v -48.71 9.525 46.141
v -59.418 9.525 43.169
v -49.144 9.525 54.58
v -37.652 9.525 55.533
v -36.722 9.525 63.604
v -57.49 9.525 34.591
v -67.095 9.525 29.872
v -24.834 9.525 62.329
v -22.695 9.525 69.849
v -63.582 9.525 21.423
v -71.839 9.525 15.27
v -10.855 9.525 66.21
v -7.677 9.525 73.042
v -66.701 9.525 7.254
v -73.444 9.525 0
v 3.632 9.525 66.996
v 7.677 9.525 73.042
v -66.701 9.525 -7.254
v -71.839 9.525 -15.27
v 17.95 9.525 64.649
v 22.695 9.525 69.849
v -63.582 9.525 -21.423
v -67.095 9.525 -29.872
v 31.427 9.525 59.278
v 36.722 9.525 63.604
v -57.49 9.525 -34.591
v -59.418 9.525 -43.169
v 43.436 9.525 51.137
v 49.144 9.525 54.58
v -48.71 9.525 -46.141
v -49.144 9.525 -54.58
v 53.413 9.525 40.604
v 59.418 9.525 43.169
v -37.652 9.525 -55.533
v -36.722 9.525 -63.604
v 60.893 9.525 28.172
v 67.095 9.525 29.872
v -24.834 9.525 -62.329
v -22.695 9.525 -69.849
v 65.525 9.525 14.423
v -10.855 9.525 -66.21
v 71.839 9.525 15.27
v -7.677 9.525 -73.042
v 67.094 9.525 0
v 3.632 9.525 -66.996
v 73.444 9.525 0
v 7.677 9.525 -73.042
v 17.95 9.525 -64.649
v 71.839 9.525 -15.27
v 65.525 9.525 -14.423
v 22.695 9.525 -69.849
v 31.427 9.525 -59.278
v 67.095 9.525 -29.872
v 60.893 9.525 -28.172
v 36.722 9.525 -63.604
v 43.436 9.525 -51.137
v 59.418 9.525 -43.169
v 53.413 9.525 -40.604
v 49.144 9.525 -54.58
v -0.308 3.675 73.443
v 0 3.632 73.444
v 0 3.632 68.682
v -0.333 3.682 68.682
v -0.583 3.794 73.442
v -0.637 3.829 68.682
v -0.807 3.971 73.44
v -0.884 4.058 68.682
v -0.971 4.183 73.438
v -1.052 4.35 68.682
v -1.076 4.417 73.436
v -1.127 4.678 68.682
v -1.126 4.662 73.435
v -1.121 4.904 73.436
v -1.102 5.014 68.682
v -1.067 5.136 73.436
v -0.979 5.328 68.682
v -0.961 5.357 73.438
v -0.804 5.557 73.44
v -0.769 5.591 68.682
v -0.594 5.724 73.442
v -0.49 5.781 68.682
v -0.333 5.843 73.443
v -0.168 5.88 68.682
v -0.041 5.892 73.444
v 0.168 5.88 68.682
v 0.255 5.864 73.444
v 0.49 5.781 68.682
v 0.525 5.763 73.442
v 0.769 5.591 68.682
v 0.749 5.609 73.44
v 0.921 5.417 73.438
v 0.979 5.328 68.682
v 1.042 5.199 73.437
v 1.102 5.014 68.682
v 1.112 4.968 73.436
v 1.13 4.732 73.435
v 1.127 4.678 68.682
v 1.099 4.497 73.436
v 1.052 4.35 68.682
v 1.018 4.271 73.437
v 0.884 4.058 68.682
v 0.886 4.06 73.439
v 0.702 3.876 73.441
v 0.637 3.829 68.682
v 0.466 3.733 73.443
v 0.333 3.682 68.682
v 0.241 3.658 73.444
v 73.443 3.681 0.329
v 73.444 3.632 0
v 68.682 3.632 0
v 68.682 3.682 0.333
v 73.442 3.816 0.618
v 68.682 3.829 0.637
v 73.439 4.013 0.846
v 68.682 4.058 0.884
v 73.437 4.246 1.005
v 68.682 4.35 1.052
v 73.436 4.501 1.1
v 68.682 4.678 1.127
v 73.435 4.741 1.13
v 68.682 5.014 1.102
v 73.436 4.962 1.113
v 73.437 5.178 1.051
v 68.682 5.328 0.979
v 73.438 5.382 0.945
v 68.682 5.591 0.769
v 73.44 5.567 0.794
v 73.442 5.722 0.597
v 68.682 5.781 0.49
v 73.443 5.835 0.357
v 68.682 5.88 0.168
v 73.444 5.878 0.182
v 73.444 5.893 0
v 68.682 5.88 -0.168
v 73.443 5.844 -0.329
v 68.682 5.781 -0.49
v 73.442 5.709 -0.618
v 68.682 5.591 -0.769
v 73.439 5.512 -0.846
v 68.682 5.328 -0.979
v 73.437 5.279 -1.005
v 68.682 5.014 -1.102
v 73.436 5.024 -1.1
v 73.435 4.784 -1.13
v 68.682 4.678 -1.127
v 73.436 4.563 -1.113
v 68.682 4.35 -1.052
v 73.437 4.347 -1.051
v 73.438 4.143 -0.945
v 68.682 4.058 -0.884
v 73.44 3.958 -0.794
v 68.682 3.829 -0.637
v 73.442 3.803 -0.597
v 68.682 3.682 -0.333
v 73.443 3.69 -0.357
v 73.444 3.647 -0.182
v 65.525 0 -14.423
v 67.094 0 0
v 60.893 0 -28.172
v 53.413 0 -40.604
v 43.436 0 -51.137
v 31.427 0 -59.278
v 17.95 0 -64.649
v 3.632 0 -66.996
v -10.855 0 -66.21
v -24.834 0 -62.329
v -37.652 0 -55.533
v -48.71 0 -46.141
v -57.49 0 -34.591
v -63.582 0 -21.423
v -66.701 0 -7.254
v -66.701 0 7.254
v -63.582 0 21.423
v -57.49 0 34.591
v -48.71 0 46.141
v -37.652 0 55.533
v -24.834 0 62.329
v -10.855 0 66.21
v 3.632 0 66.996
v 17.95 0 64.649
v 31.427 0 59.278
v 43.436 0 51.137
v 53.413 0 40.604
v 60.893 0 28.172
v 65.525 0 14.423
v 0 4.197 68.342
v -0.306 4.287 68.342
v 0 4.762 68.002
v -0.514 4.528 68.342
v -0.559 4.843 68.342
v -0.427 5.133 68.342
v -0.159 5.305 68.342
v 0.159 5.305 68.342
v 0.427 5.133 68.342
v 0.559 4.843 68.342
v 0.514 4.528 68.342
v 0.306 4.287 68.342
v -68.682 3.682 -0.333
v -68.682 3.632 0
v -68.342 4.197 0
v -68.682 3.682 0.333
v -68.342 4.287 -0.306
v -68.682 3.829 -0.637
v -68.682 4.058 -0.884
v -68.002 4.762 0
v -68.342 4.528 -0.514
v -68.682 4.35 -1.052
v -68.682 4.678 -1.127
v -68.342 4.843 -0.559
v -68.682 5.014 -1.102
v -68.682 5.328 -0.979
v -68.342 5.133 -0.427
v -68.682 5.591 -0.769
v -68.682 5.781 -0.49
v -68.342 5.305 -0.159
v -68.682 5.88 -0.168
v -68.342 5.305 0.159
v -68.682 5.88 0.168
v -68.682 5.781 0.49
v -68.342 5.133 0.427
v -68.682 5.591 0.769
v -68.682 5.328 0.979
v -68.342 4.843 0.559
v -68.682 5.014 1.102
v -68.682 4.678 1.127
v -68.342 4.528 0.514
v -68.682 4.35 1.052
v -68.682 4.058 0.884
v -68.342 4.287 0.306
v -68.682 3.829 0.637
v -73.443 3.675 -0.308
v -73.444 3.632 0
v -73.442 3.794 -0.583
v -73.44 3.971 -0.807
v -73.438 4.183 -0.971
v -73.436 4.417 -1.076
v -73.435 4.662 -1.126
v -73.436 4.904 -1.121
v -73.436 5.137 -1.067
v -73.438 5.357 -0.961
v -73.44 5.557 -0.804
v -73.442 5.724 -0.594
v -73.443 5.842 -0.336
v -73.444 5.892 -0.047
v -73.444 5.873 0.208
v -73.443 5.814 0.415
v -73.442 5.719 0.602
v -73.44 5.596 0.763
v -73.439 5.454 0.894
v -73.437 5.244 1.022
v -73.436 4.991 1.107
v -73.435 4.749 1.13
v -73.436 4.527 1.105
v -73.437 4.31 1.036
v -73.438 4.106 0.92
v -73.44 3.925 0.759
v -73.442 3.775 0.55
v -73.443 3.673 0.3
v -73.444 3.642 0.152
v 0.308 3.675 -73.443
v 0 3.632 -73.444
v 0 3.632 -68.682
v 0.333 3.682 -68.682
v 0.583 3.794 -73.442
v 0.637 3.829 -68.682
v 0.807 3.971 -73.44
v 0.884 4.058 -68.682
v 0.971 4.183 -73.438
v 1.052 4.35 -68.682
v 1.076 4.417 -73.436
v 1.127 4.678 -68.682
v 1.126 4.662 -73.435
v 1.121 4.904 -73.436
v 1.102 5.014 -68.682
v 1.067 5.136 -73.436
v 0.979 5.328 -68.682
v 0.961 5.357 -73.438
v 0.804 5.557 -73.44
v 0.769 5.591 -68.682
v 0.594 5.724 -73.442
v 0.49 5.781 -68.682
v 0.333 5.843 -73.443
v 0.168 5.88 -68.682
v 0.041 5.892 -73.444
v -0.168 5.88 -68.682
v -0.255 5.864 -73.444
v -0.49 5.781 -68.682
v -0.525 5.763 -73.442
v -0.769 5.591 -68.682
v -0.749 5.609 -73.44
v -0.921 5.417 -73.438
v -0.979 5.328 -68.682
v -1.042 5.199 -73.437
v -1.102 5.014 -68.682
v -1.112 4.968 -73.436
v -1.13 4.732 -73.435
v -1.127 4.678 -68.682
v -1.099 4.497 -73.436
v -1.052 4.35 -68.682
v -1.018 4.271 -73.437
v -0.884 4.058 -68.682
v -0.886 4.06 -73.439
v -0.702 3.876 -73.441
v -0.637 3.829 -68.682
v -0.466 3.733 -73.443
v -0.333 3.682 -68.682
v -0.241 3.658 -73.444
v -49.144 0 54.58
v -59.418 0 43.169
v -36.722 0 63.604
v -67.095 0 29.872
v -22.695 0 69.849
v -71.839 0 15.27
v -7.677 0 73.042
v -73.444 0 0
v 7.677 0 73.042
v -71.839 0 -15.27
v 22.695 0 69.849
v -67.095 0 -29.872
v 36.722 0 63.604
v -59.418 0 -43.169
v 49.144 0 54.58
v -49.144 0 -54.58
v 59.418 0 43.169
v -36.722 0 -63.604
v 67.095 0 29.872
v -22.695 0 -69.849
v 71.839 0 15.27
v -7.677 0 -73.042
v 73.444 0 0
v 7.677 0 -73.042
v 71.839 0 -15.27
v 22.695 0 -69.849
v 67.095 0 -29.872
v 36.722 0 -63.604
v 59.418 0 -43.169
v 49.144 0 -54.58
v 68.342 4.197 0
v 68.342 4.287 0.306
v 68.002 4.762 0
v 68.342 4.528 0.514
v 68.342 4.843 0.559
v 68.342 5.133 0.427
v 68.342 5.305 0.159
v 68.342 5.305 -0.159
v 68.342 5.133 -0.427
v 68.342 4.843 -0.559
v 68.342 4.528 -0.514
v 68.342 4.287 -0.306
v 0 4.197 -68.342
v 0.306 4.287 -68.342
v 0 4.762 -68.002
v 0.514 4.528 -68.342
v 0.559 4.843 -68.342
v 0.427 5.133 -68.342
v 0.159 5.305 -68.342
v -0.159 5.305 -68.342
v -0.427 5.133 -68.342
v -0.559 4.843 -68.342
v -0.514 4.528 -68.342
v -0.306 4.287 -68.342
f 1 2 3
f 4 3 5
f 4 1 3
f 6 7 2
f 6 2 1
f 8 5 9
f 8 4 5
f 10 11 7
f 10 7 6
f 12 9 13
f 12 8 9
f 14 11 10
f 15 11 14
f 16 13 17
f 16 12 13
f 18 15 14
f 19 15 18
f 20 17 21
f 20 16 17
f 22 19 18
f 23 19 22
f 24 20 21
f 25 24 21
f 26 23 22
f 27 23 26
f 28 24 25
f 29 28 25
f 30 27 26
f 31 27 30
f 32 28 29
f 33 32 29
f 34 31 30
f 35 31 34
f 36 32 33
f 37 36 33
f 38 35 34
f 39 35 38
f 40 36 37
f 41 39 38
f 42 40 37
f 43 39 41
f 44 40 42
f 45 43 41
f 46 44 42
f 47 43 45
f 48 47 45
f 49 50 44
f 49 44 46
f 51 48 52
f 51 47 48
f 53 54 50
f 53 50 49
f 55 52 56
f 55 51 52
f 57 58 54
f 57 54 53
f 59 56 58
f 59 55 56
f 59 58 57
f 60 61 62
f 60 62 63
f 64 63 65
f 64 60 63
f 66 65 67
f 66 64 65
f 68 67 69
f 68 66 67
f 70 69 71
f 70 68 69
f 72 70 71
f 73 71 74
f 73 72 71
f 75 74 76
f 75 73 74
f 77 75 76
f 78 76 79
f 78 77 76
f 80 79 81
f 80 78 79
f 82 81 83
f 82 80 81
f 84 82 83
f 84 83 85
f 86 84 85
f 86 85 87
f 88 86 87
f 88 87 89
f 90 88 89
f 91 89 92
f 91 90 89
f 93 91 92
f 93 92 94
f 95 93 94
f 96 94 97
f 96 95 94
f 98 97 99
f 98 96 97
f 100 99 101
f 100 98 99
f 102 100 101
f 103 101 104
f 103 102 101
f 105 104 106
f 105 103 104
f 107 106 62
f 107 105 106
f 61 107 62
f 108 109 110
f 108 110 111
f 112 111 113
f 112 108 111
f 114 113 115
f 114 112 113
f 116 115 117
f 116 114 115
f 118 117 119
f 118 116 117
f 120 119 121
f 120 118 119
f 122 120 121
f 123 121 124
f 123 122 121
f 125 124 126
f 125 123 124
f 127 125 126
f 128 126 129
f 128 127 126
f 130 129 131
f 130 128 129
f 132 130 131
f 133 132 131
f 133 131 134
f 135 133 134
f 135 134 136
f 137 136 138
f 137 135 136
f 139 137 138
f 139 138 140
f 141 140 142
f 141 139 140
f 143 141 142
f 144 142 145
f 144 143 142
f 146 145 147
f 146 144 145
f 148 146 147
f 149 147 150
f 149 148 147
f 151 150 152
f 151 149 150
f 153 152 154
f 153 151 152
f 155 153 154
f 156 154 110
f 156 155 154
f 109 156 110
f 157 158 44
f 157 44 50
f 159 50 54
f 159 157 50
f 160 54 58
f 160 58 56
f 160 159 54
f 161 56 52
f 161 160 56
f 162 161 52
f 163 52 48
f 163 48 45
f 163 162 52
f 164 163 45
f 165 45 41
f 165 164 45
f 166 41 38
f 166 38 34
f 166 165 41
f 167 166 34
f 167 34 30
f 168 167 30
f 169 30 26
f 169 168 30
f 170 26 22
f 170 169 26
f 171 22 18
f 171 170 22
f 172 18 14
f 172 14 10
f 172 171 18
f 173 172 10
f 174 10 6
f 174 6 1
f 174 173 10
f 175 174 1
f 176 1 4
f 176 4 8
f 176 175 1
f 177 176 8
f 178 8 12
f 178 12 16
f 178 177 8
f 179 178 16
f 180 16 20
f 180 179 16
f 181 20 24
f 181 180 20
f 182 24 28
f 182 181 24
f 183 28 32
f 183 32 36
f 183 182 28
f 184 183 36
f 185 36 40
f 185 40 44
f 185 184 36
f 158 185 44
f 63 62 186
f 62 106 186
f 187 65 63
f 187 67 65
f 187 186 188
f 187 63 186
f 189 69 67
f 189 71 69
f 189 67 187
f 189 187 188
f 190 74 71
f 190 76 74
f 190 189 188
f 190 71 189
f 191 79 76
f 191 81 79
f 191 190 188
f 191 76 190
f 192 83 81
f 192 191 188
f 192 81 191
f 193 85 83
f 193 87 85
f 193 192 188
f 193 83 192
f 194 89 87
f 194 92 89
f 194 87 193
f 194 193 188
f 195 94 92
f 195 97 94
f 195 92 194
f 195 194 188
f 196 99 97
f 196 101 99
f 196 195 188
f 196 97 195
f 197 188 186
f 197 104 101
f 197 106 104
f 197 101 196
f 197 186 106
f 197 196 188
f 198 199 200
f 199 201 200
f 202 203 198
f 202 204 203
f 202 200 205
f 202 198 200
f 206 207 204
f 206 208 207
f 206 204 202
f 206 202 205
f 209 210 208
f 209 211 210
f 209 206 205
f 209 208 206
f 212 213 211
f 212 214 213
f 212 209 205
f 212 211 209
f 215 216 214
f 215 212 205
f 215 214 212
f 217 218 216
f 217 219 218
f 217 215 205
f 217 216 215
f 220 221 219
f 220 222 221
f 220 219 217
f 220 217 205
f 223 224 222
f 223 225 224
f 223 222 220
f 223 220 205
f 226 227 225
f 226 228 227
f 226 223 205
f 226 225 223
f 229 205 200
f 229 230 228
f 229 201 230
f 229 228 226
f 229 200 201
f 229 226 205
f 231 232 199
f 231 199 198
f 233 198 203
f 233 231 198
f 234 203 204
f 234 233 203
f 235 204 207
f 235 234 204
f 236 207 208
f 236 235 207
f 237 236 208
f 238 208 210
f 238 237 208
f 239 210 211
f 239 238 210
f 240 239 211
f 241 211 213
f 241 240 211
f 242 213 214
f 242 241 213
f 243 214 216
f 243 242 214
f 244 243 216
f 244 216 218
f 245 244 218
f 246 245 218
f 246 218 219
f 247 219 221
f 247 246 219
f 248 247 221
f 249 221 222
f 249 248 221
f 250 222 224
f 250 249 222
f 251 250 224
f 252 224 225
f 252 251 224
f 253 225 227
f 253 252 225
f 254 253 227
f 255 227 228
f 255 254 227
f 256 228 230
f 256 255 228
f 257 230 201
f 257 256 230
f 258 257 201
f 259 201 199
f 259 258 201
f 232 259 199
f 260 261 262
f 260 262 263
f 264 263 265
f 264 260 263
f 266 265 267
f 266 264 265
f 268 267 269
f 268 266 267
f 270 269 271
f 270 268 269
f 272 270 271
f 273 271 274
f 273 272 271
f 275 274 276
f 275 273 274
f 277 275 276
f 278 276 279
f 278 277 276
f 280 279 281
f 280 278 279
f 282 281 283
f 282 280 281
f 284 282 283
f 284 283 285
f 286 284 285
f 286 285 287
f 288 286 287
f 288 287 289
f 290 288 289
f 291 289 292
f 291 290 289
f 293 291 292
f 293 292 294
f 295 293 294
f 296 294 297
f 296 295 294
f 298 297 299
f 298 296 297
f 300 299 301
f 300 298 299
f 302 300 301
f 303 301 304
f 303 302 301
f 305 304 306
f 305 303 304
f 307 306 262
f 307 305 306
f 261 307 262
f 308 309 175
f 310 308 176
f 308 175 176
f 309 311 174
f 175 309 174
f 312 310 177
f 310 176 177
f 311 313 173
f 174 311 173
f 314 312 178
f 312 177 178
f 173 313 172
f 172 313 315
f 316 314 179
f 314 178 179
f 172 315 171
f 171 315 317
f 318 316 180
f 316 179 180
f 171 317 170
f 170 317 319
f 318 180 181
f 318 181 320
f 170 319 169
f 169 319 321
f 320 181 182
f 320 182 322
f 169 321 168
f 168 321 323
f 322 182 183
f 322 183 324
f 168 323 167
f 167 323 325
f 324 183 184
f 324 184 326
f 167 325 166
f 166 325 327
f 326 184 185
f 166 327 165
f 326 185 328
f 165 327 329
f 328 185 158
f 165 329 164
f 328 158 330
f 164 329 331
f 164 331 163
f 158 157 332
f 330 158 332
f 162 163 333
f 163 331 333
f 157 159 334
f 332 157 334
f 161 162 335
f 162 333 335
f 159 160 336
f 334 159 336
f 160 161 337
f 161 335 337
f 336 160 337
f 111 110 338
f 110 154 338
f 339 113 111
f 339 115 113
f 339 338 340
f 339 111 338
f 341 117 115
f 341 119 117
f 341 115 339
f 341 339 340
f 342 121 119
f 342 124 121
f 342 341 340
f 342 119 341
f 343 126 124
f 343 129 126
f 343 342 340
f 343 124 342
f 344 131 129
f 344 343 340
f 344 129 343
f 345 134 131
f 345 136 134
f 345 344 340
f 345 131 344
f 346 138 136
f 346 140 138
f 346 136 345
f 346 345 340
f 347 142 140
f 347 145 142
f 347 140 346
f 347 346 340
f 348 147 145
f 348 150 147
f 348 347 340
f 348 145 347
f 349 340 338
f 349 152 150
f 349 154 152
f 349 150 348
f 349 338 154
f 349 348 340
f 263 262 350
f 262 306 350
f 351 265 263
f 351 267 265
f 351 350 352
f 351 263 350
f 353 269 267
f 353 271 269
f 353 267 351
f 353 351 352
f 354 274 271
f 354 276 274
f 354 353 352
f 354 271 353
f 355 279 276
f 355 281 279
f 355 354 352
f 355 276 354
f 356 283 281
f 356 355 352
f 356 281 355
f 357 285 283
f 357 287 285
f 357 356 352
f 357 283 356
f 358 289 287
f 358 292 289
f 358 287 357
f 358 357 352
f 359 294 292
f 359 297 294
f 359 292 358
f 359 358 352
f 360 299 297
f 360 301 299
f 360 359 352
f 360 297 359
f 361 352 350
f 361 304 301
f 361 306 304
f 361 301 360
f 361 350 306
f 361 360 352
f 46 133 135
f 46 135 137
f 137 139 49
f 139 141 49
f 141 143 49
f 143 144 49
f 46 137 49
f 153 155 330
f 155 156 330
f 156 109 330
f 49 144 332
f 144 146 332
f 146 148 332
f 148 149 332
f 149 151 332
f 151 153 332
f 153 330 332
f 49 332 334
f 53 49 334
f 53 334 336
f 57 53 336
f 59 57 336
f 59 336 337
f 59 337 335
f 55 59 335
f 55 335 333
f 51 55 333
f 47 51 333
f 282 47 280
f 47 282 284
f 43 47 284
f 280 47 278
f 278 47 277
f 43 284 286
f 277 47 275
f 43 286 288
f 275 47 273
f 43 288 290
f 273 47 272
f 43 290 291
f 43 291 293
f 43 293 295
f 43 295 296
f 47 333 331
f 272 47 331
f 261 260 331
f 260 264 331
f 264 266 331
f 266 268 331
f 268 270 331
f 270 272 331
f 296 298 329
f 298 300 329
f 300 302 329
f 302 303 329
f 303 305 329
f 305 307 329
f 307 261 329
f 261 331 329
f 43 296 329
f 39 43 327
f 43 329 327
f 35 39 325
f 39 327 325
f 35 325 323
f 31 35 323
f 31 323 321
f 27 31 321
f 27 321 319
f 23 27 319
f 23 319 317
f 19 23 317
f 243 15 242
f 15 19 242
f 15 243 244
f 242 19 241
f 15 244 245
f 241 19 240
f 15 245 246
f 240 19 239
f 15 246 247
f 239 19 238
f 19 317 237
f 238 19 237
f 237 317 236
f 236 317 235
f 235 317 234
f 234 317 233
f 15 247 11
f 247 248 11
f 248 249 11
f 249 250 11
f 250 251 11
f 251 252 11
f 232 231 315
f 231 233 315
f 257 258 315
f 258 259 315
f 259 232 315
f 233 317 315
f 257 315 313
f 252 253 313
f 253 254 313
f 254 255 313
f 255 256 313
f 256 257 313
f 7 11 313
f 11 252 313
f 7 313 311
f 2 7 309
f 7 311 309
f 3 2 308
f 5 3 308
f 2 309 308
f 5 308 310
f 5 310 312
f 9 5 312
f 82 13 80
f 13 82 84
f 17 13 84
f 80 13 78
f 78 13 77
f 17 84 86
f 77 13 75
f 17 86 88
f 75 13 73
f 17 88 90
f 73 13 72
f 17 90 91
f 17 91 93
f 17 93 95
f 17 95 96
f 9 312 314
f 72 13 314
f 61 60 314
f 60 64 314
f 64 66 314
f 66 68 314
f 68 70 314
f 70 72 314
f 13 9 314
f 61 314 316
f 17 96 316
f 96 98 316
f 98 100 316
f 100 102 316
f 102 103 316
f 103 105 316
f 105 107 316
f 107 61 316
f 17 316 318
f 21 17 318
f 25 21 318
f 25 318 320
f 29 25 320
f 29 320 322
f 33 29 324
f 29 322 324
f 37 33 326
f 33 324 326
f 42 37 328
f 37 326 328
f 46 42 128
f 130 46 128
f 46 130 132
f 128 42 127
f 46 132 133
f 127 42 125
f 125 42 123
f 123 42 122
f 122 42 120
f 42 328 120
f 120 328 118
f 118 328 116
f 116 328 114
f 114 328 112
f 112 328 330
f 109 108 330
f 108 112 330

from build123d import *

# Parameters (mm, degrees)
SKETCH1_R           = 73.4441
SKETCH1_R_2         = 67.0941
BOSS_EXTRUDE1_DEPTH = 9.525
CIRPATTERN1_COUNT   = 4


with BuildPart() as part:
    # Sketch1 → Boss-Extrude1 (new body)
    with BuildSketch(Plane(origin=(0, 0, 0), x_dir=(1, 0, 0), z_dir=(0, 1, 0))):
        Circle(SKETCH1_R)
        Circle(SKETCH1_R_2, mode=Mode.SUBTRACT)
    extrude(amount=BOSS_EXTRUDE1_DEPTH)

    # Sketch3 → Tap Drill for #4-40 Tap1 (revolve, cut)
    with BuildSketch(Plane(origin=(0, 4.7625, 73.4441), x_dir=(0, -1, 0), z_dir=(1, 0, 0))):
        Polygon((0, 0), (0, 5.441652758), (1.1303, 4.7625), (1.1303, 0), align=None)
    tap_drill_for_4_40_tap1 = revolve(axis=Axis((0, 4.7625, 79.7941), (0, 0, -1)), mode=Mode.SUBTRACT)

    # CirPattern1: Tap Drill for #4-40 Tap1 ×4 about axis
    cirpattern1_axis = Axis((0, 9.525, 0), (0, 1, 0))
    for i in range(1, CIRPATTERN1_COUNT):
        add(tap_drill_for_4_40_tap1.rotate(cirpattern1_axis, i * 360 / CIRPATTERN1_COUNT), mode=Mode.SUBTRACT)


solid = part.part
